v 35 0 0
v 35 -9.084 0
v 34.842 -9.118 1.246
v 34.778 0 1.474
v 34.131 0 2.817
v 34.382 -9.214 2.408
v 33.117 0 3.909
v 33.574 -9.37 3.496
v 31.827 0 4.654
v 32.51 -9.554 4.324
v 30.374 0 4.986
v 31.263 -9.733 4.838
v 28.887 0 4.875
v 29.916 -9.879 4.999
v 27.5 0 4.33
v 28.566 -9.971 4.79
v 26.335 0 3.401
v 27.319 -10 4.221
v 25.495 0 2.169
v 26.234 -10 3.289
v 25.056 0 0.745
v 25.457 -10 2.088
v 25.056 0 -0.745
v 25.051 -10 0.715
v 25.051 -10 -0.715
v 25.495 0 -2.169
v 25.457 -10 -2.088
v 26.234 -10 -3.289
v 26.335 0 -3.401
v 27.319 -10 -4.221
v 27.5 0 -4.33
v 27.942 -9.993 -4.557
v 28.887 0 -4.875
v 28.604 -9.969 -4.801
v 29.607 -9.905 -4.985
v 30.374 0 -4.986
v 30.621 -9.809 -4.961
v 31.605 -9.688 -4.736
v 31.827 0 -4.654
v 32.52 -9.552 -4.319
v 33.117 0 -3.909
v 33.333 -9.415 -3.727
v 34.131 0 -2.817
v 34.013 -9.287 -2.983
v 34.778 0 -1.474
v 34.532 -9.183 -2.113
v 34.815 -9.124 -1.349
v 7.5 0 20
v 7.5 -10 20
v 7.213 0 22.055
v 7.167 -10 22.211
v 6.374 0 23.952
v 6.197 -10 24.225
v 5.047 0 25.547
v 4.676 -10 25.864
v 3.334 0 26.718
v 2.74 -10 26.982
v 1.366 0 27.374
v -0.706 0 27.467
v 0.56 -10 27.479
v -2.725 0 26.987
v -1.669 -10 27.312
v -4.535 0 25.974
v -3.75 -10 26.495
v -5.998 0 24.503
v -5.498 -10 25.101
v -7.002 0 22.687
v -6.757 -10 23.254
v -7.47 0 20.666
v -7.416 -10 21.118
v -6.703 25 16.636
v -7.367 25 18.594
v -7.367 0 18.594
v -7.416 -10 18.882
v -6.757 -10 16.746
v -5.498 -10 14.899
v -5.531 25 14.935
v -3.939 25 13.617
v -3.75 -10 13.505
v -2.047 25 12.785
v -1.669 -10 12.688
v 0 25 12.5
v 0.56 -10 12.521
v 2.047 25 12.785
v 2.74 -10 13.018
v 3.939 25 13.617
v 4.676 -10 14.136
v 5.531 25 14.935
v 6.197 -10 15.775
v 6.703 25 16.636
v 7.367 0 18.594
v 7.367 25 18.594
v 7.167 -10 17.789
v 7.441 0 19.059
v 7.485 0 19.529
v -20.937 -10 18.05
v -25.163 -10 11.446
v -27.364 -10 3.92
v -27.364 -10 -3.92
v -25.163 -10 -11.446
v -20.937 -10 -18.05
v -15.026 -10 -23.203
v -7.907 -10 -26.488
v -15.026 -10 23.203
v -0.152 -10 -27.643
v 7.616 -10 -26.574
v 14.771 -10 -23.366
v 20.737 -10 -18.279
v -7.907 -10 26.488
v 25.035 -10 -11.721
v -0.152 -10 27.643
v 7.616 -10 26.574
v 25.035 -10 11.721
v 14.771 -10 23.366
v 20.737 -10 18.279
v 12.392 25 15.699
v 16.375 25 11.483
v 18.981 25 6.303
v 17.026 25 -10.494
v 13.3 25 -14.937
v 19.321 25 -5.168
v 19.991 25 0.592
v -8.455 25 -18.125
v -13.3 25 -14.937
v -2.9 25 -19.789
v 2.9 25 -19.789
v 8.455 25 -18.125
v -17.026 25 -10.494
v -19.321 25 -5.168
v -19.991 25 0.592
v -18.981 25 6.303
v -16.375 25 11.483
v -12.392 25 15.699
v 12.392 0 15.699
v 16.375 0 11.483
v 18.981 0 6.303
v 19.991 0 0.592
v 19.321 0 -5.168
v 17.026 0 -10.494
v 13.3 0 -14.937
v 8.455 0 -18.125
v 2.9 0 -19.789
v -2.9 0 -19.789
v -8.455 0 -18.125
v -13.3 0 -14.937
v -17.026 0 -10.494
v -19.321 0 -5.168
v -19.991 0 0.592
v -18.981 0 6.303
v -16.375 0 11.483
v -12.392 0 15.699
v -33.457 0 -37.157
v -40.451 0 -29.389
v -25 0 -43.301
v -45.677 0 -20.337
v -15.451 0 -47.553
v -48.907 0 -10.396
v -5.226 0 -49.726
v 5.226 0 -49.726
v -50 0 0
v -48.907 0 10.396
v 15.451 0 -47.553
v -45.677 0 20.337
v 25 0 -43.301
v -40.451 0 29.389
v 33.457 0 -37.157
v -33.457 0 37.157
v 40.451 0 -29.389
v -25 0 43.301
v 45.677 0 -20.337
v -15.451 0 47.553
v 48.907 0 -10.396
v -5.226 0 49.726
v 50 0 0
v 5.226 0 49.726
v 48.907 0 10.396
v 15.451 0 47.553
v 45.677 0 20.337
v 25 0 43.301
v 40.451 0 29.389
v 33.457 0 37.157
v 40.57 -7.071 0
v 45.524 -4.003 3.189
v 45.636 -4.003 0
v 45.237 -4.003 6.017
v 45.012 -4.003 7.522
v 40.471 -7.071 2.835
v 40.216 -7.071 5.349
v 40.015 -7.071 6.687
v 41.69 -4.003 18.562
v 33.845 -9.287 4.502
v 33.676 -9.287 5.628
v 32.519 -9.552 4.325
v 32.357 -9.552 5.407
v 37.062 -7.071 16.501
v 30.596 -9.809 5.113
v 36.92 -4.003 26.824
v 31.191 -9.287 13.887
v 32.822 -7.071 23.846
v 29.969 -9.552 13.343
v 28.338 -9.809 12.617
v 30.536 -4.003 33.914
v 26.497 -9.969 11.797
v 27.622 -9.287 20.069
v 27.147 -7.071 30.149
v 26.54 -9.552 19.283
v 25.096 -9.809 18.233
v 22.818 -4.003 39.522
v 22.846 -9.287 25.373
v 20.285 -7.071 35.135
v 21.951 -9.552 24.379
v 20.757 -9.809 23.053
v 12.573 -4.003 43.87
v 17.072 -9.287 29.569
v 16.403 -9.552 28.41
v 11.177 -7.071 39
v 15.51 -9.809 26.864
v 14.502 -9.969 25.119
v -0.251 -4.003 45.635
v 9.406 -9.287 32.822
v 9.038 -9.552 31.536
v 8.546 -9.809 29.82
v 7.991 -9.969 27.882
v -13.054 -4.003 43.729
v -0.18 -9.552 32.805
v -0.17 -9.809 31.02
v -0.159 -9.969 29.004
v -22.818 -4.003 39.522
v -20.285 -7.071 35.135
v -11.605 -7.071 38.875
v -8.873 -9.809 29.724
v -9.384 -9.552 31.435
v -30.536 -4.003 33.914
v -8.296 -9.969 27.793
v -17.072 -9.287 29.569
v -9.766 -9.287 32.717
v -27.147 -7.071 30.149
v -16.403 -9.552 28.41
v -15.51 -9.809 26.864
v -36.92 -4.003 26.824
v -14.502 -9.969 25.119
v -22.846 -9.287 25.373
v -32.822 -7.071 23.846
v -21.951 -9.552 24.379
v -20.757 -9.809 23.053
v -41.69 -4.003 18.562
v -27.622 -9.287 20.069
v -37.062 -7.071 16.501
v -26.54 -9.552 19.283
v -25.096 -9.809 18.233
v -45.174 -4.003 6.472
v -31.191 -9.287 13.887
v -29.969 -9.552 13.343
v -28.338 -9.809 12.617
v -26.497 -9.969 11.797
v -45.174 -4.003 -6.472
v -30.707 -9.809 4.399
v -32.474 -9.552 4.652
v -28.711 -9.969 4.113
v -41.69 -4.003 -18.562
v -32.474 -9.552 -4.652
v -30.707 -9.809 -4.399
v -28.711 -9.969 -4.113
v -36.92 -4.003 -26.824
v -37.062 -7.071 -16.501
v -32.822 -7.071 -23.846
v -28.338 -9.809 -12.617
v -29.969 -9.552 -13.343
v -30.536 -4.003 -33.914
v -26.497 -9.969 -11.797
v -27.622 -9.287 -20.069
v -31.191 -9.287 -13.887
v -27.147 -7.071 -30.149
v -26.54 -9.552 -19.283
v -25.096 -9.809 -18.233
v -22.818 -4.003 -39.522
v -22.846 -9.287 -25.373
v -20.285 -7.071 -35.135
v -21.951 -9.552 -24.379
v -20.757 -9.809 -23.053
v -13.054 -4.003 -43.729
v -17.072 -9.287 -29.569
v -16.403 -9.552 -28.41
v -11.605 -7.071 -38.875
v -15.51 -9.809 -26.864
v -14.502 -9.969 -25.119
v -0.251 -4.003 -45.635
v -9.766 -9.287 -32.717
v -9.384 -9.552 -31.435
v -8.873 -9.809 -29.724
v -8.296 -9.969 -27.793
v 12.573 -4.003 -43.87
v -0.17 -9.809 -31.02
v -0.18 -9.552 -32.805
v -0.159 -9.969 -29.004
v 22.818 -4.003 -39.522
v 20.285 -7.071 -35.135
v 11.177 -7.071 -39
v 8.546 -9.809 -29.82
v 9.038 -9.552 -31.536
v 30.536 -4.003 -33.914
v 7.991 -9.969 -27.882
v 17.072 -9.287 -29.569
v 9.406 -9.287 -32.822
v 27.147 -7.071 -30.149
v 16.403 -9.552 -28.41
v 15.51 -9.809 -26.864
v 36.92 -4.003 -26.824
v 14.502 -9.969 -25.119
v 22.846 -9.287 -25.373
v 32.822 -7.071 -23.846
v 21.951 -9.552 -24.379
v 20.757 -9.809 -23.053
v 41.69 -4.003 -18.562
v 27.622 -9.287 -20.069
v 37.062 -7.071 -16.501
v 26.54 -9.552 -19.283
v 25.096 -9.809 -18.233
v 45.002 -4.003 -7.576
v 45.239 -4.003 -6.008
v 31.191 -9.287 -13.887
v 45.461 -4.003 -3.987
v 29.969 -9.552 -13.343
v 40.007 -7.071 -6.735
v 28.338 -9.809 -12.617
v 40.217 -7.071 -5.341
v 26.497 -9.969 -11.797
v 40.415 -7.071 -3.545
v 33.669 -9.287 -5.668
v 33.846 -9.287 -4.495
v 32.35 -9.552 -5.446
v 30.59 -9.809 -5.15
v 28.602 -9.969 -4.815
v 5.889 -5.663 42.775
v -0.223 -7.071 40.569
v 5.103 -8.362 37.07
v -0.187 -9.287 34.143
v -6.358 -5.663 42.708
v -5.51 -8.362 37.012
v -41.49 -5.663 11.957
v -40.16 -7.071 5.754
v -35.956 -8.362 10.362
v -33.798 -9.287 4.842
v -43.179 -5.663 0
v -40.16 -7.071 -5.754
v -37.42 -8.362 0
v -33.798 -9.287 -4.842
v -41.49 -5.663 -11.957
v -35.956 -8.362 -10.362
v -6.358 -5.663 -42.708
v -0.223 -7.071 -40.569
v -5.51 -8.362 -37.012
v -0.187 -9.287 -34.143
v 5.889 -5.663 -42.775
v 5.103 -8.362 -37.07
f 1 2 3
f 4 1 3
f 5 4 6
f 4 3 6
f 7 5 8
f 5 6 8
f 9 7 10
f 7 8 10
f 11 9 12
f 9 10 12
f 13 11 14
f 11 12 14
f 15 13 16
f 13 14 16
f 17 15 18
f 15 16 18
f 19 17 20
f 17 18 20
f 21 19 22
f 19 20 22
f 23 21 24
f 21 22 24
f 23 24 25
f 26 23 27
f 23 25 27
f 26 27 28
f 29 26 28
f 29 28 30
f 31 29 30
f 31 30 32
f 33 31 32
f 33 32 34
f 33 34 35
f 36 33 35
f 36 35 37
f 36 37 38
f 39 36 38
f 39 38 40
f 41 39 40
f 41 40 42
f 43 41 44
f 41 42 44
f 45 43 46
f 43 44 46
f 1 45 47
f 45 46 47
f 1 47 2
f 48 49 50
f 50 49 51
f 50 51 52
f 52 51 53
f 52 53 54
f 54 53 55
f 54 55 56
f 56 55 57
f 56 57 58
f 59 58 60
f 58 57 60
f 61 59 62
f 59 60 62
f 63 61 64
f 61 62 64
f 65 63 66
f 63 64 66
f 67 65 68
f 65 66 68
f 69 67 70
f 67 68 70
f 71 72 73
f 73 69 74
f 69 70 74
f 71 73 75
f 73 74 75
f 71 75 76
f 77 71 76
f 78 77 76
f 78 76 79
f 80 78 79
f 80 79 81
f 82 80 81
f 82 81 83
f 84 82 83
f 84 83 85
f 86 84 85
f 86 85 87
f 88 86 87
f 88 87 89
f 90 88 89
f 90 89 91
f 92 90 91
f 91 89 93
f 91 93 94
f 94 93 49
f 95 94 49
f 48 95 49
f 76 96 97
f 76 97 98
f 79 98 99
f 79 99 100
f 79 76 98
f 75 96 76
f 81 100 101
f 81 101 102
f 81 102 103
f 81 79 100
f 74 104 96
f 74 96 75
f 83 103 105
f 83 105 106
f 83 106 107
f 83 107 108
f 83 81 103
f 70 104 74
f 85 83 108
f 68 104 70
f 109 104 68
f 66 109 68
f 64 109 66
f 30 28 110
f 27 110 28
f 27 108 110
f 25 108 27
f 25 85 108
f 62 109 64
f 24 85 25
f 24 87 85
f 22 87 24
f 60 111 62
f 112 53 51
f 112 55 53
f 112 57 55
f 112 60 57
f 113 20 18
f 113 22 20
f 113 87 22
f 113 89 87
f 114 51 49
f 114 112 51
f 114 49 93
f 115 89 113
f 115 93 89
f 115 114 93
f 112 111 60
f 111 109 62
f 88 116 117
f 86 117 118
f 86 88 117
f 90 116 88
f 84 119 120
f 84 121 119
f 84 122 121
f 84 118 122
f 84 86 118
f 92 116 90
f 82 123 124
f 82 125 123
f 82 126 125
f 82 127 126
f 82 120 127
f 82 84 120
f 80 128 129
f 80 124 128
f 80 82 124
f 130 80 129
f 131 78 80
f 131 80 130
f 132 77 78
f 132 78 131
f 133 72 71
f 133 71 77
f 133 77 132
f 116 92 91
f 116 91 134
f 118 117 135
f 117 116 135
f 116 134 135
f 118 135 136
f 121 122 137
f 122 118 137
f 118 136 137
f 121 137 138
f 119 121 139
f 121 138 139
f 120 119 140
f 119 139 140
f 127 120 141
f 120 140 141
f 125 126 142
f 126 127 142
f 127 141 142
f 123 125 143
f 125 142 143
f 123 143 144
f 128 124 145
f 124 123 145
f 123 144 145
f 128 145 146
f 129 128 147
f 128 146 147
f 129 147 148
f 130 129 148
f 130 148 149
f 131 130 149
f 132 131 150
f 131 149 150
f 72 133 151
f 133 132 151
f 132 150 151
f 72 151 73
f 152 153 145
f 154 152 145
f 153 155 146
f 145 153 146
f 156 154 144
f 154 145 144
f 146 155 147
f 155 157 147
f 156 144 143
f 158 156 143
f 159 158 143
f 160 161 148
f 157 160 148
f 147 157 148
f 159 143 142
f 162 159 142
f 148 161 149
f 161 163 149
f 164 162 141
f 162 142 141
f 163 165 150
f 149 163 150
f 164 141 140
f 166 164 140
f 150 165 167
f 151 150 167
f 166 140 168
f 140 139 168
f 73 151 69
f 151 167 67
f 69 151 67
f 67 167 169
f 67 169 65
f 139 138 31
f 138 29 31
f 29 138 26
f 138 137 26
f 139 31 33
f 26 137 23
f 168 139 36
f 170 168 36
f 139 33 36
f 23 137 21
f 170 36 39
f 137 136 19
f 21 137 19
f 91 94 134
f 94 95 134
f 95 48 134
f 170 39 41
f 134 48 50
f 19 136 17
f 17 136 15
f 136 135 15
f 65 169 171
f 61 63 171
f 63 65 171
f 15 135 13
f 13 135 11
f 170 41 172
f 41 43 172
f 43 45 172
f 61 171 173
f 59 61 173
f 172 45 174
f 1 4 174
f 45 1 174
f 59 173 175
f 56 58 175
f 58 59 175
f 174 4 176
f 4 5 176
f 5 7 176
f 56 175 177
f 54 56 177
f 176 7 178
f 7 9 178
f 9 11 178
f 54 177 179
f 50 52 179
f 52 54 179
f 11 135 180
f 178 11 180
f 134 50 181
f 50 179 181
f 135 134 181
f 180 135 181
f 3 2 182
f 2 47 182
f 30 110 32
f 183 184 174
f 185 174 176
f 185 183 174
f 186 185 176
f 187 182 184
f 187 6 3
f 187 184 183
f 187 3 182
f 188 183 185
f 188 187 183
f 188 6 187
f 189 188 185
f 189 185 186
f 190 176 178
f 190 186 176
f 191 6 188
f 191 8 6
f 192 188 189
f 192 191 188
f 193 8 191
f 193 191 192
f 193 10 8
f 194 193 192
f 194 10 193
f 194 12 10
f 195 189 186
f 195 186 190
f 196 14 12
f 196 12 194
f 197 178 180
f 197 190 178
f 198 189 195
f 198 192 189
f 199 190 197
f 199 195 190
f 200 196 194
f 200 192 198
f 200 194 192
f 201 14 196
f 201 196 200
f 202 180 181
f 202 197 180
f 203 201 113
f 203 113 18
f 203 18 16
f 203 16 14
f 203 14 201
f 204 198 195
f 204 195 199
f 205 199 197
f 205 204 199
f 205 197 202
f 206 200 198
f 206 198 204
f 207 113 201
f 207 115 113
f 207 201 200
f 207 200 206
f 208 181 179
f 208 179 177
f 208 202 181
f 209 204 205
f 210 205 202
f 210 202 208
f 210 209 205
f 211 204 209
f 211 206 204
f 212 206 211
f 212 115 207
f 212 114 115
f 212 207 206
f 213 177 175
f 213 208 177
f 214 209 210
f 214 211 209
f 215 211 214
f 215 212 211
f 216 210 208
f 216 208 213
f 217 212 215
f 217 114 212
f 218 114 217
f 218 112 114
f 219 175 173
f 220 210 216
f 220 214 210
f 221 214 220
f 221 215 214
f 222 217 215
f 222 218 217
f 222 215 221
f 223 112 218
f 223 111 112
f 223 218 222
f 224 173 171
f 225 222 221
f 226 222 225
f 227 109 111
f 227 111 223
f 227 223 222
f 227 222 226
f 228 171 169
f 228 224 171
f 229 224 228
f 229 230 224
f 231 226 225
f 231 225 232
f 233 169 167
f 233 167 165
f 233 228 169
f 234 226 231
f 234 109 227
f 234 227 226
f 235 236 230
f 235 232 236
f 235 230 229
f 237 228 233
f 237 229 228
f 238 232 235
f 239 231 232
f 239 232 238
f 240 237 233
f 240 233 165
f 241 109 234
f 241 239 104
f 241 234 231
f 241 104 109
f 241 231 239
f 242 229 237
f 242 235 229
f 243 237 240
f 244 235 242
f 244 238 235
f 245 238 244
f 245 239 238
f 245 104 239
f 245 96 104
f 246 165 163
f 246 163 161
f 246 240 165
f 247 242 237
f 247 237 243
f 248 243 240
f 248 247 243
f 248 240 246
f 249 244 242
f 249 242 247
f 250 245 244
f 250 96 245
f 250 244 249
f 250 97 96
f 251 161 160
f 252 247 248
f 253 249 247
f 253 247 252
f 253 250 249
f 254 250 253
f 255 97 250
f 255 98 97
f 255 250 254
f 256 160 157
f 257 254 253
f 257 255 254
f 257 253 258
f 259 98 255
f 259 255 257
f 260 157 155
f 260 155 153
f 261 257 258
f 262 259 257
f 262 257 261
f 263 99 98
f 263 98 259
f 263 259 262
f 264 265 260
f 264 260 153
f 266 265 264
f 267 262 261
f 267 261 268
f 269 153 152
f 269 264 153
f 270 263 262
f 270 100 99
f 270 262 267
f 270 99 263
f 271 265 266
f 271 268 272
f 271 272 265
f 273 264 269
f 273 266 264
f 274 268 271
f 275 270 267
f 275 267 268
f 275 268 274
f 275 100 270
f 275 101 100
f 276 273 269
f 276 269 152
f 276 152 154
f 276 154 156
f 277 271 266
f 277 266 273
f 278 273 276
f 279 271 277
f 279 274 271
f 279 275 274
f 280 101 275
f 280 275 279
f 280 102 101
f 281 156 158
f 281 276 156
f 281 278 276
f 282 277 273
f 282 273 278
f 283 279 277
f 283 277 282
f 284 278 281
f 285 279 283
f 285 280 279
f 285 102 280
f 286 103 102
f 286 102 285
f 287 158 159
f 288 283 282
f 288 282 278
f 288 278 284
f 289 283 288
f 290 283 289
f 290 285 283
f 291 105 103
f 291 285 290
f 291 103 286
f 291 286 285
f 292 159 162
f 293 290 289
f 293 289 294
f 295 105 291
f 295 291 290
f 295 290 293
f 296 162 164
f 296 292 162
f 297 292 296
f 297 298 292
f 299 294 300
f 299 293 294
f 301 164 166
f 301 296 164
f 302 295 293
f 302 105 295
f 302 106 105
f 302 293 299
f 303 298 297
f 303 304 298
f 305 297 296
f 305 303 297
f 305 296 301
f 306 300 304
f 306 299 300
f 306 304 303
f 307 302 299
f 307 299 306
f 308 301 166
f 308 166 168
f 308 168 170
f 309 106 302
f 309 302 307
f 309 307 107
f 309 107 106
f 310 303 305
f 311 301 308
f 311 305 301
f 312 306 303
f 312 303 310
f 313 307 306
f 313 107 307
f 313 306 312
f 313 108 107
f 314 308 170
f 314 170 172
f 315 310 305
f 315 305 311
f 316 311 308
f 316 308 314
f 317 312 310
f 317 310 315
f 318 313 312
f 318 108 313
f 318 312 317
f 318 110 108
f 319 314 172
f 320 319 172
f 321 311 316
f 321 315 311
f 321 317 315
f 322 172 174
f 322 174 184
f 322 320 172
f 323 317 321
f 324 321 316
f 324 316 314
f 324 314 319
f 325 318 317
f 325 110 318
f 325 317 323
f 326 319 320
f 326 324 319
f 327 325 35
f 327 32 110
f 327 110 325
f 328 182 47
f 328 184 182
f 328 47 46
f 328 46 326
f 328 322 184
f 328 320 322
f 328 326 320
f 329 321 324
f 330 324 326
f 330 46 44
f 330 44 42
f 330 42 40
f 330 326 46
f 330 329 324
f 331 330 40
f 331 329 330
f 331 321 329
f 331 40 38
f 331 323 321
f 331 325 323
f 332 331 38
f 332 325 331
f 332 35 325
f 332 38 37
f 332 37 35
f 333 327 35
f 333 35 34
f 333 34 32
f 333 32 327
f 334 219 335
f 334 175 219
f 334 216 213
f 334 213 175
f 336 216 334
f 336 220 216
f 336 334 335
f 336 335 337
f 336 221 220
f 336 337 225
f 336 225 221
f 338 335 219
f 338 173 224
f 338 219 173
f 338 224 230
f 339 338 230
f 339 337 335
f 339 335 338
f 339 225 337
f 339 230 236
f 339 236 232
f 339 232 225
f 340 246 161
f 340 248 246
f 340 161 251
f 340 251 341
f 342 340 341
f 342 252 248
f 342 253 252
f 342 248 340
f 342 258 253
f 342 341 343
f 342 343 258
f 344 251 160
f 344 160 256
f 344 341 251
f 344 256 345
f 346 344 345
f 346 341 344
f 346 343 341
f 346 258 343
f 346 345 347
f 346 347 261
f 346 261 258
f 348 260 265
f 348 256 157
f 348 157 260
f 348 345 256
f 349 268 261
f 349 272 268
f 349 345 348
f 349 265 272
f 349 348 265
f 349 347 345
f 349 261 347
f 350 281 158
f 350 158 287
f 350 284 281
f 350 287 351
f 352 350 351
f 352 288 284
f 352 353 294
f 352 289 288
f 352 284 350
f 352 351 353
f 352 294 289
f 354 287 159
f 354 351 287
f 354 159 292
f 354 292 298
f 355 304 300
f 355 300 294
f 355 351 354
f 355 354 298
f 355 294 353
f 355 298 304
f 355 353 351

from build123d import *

# Parameters (mm, degrees)
F0_R     = 50
F1_DEPTH = 10
F2_R     = 20
F3_DEPTH = 25
F5_R     = 5
F6_DEPTH = 85.6401380152
F7_R     = 7.5
F8_DEPTH = 57.2151485831


# Not quite as in the source:
# - a fillet or chamfer that OpenCascade refuses, or shapes differently, is made with other operations: its cross-section is extruded or revolved along the edge and cut away or added


with BuildPart() as f1:
    # F0 (on Front) → F1 (new body)
    with BuildSketch(Plane.XZ):
        Circle(F0_R)
    extrude(amount=F1_DEPTH)

    # F2 (on face) → F3 (join)
    with BuildSketch(Plane(origin=(0, 0, 0), x_dir=(-1, 0, 0), z_dir=(0, 1, 0))):
        Circle(F2_R)
    extrude(amount=F3_DEPTH)

    # F5 (on offset) → F6 (cut)
    with BuildSketch(Plane.XZ.offset(10)):
        with Locations((30, 0)):
            Circle(F5_R)
    extrude(amount=-F6_DEPTH, mode=Mode.SUBTRACT)

    # F7 (on face) → F8 (cut)
    with BuildSketch(Plane.XZ.offset(10)):
        with Locations((0, 20)):
            Circle(F7_R)
    extrude(amount=-F8_DEPTH, mode=Mode.SUBTRACT)

    # F9: fillet of radius 29.9906943199 on 1 edges, made by hand

    # F9_s1 → F9_t2 (revolve, cut)
    with BuildSketch(Plane.XY):
        with BuildLine():
            ThreePointArc((50, 0), (39.8890312916, -7.3860891689), (27.643482239, -10))
            Line((27.643482239, -10), (50, -10))
            Line((50, -10), (50, 0))
        make_face()
    revolve(axis=Axis((0, -10, 0), (0, -1, 0)), mode=Mode.SUBTRACT)


solid = f1.part
